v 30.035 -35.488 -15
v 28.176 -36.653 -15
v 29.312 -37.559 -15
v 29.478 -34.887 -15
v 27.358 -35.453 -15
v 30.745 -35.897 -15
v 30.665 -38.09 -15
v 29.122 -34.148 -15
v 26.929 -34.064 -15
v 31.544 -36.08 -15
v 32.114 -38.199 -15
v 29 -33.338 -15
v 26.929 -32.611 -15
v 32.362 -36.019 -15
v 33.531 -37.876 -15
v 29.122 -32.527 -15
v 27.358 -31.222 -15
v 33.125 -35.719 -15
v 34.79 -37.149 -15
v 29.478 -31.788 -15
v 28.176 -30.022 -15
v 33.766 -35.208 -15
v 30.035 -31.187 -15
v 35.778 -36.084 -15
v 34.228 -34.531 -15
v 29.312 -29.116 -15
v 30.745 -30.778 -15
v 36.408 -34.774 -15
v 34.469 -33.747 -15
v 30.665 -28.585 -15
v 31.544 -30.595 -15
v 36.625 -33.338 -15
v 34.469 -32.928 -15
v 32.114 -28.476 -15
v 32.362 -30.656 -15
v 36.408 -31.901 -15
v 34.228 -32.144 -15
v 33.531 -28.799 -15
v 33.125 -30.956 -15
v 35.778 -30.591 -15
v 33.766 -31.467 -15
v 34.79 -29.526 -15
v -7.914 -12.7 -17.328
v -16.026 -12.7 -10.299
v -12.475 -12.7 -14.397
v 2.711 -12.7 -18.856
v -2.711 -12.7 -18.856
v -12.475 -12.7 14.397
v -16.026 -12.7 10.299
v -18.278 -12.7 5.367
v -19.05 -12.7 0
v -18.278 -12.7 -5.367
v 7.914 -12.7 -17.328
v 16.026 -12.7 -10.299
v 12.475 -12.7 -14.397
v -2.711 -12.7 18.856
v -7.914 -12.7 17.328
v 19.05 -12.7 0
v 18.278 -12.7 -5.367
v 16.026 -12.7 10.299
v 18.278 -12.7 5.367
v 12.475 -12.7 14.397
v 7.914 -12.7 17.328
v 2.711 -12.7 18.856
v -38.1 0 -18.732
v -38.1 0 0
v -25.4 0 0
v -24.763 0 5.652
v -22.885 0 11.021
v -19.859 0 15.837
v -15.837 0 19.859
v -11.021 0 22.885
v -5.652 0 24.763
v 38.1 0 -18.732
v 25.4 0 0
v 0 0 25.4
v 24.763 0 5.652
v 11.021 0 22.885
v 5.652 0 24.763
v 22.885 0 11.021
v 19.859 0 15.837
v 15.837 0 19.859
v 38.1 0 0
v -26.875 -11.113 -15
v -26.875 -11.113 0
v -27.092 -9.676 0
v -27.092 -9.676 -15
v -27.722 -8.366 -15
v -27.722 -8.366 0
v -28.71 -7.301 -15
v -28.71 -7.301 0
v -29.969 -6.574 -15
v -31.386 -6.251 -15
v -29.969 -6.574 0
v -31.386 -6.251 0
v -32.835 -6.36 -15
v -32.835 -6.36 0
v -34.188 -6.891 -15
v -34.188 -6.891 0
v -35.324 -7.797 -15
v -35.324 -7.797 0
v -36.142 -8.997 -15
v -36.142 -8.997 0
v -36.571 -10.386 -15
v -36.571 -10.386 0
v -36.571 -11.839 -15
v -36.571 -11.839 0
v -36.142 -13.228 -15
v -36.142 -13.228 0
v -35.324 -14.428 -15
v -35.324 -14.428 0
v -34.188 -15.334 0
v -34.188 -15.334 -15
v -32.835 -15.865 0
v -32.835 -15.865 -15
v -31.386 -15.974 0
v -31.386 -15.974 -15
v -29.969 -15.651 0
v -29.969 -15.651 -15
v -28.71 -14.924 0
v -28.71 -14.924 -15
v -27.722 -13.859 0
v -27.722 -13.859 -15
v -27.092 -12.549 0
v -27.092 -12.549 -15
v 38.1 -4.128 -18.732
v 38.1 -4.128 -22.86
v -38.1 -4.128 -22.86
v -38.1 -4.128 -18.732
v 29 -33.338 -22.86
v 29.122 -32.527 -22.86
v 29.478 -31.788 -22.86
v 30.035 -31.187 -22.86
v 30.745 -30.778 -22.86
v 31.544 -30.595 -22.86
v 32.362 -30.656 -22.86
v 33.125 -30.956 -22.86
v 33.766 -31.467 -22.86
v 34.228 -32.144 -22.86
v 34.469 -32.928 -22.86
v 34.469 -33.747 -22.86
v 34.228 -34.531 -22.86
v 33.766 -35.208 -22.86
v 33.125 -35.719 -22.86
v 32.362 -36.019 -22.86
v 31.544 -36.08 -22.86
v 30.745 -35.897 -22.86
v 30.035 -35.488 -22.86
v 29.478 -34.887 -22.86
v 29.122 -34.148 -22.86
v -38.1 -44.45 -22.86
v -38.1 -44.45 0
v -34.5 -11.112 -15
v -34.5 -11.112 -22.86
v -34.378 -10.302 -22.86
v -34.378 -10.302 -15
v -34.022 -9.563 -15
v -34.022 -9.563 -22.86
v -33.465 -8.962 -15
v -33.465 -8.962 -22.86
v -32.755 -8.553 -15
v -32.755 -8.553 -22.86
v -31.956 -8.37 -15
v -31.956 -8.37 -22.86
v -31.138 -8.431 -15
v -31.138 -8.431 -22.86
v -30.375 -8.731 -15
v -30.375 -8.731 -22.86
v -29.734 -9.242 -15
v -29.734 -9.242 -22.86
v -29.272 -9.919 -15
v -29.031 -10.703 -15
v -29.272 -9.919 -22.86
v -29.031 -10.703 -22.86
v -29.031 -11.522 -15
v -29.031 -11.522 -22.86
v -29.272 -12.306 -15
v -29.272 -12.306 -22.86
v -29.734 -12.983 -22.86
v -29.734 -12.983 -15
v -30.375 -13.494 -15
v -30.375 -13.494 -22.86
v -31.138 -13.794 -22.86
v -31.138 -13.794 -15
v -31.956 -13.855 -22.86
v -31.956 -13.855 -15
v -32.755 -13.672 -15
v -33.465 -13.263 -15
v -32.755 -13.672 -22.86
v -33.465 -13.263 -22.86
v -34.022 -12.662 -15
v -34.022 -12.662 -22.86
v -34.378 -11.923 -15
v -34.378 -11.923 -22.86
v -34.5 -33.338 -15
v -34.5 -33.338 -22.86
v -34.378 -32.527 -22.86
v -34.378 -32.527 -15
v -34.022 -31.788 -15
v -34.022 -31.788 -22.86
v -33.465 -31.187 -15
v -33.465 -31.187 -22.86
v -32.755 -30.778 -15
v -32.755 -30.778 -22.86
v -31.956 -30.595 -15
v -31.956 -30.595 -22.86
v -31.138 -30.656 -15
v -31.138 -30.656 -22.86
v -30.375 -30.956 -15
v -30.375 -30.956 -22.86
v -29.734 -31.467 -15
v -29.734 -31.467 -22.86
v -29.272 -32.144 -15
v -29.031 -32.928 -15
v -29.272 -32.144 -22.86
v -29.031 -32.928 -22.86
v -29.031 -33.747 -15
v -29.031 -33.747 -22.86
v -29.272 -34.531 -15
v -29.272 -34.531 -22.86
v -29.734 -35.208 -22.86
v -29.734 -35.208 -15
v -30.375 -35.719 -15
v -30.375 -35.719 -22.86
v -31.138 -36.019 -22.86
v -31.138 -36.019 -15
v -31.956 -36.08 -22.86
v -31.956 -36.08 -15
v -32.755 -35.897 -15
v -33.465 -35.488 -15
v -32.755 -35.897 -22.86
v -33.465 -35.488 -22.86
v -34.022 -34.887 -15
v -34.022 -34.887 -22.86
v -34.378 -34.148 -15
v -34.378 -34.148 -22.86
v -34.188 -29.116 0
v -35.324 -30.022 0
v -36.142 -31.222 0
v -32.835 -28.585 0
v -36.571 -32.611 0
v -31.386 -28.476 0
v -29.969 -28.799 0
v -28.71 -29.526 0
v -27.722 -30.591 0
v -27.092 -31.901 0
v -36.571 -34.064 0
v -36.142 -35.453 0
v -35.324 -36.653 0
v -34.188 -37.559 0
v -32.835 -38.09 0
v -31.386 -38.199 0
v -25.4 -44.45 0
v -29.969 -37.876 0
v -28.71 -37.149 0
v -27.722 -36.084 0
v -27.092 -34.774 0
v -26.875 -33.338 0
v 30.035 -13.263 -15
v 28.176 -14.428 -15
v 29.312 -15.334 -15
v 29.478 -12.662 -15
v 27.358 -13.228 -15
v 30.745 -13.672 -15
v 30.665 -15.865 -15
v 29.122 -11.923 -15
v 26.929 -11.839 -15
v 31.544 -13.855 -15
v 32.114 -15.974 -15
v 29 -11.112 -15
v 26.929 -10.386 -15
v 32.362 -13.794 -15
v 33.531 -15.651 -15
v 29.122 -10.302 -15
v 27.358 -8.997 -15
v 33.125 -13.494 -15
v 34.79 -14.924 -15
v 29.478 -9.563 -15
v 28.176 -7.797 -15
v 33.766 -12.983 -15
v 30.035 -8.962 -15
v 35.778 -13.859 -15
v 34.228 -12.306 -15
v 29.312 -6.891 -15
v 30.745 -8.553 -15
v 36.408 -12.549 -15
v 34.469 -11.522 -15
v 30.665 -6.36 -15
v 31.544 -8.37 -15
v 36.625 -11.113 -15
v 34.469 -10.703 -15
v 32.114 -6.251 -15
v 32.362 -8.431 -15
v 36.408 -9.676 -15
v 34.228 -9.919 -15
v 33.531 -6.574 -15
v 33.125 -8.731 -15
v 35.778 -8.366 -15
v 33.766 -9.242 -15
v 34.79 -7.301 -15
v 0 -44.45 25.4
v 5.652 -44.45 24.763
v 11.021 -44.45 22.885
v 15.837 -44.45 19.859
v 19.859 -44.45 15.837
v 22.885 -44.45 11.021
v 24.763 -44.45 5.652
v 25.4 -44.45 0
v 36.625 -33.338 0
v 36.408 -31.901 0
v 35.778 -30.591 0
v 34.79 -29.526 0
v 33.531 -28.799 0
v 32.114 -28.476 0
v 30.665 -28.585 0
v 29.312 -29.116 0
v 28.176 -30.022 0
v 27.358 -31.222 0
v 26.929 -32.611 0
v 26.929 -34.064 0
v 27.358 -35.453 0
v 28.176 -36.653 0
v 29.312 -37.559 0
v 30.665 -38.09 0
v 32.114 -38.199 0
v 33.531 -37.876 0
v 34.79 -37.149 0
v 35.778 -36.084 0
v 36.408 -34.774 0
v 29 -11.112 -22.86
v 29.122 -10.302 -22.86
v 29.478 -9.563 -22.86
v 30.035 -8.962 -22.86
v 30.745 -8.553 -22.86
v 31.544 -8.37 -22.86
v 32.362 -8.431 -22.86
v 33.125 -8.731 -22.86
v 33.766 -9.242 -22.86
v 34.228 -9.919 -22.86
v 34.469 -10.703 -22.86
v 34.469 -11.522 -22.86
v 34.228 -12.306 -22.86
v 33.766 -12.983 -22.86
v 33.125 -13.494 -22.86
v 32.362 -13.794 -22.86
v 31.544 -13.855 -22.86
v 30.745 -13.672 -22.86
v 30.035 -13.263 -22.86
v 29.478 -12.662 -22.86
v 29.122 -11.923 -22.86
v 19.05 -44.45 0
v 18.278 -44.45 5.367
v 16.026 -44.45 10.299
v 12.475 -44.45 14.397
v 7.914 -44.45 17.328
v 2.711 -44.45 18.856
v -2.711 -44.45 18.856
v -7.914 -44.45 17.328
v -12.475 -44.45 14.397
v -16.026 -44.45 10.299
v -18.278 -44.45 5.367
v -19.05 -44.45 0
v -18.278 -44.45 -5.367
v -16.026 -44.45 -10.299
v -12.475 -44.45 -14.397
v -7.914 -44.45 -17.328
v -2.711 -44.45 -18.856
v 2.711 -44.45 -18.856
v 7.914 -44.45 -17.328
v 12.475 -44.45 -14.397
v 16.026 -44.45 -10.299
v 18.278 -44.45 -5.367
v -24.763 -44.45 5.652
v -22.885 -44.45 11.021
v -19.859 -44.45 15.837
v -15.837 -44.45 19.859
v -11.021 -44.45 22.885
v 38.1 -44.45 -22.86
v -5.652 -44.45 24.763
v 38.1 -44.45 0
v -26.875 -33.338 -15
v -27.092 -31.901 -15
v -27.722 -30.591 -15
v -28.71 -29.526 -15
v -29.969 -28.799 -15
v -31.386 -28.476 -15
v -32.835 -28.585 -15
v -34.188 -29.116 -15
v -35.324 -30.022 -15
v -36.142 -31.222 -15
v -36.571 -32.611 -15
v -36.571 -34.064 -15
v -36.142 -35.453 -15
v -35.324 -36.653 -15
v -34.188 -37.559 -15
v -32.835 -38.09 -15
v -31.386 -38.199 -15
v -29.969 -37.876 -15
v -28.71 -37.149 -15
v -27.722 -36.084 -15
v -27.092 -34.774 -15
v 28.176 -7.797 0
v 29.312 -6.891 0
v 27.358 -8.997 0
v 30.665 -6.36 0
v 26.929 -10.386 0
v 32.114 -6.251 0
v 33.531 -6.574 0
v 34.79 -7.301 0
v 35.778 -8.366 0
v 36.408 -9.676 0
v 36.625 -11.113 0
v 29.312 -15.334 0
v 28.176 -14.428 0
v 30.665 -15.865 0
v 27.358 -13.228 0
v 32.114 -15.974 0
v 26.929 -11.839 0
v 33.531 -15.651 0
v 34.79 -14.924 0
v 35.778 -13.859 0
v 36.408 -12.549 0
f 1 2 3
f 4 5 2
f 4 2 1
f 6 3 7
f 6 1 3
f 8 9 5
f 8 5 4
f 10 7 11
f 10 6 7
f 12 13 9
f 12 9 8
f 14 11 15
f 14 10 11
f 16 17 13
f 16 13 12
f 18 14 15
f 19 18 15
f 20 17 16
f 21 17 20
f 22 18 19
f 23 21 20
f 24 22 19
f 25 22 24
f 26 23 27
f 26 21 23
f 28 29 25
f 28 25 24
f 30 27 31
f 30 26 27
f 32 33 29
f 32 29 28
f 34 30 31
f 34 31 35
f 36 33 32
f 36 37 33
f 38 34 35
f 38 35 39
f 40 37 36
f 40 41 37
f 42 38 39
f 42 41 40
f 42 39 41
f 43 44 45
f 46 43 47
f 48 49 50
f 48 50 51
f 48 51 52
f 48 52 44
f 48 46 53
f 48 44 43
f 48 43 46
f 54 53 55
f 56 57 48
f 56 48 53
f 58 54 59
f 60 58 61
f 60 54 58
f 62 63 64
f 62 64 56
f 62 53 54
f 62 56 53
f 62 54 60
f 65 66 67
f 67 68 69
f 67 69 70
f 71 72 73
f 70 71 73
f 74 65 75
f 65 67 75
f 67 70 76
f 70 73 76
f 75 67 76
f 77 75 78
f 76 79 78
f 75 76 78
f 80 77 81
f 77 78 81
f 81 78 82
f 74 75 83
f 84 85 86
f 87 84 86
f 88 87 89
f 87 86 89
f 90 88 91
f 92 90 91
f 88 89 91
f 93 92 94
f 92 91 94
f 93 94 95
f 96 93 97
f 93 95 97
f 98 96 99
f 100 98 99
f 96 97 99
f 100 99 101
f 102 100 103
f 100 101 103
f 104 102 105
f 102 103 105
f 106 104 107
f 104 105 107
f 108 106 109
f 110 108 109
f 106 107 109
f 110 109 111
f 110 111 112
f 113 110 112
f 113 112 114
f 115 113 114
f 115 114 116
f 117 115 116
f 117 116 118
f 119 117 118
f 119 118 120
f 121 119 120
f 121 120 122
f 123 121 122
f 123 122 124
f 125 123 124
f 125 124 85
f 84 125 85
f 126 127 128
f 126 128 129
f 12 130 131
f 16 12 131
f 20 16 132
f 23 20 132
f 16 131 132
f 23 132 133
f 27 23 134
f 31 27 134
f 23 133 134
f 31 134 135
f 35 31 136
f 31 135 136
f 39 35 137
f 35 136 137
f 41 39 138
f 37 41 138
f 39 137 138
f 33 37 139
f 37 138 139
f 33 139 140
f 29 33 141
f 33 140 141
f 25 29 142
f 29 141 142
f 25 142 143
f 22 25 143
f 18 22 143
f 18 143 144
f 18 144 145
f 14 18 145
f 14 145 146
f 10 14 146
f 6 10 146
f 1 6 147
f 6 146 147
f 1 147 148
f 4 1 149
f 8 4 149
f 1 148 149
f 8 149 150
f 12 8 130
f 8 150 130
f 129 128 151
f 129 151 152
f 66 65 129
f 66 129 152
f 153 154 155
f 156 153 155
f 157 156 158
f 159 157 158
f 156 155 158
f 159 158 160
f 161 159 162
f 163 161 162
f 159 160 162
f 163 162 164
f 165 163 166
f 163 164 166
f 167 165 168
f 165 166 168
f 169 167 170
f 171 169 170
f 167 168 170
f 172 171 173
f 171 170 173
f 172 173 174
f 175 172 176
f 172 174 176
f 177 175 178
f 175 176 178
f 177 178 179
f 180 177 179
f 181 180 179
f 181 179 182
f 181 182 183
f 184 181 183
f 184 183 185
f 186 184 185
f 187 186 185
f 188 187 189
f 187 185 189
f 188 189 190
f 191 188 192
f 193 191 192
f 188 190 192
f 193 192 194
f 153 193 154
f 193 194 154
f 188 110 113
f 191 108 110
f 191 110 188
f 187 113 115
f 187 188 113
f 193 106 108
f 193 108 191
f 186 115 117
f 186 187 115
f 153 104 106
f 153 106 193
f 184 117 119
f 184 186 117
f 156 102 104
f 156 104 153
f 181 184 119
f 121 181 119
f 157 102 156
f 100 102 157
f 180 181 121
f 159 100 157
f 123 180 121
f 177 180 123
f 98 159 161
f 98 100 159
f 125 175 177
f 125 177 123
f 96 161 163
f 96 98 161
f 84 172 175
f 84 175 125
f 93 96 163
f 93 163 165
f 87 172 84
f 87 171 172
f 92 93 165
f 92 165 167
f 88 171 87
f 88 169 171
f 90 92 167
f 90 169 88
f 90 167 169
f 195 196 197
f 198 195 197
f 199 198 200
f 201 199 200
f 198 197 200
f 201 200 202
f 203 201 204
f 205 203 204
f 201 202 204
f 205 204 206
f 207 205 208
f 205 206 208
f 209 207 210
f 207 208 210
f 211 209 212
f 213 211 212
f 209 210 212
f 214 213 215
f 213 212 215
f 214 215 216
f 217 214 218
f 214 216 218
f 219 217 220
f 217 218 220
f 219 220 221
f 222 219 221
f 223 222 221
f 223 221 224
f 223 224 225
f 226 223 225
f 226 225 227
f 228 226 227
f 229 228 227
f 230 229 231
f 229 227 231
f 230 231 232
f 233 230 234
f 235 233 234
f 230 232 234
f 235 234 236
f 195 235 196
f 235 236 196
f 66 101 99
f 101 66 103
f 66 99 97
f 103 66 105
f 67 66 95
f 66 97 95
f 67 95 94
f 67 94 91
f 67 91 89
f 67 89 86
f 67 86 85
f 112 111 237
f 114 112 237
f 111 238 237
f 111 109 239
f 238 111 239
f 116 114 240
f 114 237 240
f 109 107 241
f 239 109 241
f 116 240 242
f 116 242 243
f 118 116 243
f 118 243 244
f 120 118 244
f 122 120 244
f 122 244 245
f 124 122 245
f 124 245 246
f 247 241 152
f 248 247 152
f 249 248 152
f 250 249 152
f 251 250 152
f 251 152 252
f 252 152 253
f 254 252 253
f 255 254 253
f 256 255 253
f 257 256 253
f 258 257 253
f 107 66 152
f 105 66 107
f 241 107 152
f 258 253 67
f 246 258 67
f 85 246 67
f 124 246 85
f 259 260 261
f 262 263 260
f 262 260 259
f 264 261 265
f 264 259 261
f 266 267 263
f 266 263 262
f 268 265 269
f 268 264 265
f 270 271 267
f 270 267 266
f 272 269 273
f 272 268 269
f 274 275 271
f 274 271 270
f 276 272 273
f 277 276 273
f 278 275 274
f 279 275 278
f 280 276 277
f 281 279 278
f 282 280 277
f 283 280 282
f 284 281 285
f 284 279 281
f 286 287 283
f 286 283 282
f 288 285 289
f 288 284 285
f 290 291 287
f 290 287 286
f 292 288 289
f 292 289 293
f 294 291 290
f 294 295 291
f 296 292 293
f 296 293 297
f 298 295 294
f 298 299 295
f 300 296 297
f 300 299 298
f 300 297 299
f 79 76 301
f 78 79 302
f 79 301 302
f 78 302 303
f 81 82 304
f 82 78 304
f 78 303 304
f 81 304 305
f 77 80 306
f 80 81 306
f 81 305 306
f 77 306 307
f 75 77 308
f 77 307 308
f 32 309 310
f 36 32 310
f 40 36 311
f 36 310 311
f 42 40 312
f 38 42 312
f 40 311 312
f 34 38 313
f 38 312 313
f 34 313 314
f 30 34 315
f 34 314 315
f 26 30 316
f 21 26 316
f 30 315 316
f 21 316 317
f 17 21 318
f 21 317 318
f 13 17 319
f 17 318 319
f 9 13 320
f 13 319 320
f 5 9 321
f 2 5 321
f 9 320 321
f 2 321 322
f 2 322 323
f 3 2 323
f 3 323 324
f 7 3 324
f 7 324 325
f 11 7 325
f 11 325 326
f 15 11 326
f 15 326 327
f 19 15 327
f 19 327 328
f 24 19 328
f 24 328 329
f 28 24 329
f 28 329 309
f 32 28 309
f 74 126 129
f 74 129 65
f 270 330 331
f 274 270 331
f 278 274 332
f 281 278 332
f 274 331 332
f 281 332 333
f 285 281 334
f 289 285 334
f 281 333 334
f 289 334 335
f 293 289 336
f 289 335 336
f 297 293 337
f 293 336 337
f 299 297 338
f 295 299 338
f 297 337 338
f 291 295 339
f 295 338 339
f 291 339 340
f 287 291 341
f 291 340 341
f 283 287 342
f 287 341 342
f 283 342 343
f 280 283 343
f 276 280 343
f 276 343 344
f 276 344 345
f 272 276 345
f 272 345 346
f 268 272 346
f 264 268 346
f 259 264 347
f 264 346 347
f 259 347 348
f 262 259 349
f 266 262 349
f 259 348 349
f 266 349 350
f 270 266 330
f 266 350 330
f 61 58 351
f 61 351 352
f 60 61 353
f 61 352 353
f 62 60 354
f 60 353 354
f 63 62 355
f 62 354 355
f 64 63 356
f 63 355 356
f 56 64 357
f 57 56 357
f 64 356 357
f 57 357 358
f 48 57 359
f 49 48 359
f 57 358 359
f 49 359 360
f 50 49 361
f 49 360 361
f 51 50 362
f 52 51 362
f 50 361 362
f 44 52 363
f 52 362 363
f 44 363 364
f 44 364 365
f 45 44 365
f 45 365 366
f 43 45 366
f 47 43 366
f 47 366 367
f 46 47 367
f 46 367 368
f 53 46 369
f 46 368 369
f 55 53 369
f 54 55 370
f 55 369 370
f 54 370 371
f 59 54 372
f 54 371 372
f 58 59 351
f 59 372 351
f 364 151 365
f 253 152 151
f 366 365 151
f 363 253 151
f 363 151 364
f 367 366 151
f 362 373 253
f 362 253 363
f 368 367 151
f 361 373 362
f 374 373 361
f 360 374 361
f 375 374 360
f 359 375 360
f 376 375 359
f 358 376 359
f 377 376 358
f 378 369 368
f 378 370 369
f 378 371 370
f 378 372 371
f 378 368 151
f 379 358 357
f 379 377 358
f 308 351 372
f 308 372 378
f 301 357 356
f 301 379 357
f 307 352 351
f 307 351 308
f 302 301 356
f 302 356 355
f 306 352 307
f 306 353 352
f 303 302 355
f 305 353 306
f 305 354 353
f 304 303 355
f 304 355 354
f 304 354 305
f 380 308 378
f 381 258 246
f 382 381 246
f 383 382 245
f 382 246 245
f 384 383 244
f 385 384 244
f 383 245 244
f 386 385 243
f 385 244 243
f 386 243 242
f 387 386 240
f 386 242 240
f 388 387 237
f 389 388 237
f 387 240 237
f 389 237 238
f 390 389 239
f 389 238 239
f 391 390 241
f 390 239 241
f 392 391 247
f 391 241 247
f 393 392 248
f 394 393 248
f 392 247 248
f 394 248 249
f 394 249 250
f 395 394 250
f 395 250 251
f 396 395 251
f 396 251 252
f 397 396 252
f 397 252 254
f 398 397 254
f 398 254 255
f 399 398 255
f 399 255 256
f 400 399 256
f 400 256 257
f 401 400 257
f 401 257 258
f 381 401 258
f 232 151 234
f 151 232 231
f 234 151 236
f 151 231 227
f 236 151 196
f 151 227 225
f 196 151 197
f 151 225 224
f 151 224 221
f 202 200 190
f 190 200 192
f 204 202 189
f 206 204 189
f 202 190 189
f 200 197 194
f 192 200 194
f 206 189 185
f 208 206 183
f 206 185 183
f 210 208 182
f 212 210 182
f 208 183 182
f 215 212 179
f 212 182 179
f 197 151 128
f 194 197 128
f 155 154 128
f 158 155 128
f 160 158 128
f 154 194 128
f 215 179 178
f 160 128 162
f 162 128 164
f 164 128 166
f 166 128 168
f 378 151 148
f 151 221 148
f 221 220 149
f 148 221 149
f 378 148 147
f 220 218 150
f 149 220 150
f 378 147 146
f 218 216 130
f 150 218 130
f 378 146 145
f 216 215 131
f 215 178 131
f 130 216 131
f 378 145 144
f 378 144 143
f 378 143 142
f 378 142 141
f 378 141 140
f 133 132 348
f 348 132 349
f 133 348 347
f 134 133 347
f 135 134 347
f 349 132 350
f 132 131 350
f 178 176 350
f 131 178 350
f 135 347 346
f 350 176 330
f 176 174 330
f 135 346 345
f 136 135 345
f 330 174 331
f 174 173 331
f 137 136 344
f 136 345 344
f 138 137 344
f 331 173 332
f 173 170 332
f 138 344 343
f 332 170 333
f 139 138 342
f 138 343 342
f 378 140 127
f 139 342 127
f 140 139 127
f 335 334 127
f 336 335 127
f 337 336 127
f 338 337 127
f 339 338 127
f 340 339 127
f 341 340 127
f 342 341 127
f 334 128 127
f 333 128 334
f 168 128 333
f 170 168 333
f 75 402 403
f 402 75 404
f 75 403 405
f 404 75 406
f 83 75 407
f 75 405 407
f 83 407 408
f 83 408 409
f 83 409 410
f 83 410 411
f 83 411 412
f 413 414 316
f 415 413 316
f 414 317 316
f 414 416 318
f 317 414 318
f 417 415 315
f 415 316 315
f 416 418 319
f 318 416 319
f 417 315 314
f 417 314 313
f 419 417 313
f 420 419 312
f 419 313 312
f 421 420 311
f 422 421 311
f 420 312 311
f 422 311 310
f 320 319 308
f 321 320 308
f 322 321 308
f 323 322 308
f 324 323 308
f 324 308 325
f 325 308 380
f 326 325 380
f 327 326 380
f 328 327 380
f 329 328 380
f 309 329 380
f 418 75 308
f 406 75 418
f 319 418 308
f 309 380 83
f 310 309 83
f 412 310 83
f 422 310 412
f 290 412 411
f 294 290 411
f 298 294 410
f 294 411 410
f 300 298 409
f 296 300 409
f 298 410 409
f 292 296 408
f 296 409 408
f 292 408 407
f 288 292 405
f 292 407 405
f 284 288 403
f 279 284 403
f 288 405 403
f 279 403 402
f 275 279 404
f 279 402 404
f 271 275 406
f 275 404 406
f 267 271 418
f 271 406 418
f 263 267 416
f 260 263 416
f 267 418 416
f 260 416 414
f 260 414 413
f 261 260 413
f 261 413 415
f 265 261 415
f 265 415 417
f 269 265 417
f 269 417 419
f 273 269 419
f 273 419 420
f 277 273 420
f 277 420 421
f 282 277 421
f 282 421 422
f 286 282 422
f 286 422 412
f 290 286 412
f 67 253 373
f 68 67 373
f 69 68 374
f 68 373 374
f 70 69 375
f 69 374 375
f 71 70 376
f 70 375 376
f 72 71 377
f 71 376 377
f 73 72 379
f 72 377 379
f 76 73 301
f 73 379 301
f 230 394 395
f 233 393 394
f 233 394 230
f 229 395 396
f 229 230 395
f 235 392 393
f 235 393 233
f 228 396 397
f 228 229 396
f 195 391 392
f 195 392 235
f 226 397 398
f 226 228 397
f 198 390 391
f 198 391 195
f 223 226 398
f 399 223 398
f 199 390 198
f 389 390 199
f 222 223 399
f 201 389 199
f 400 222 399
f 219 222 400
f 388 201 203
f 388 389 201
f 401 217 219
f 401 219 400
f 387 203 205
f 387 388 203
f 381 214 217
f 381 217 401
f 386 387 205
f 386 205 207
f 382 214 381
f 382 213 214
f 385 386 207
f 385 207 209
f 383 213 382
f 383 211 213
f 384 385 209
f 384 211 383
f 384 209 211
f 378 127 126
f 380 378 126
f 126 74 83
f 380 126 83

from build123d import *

# Parameters (mm, degrees)
F0_W           = 76.2
F0_H           = 50.8
F1_DEPTH       = 44.45
F2_R           = 19.05
F3_DEPTH       = 31.75
F5_DEPTH       = 62.992
F7_D           = 5.5
F7_DEPTH       = 254
F7_CBORE_D     = 9.75
F7_CBORE_DEPTH = 15
F7_TIP         = 1.6523667023
F8_DEPTH       = 2.54
F9_W           = 4.1275
F9_H           = 4.1275
F10_DEPTH      = 86.36


with BuildPart() as f1:
    # F0 (on Front) → F1 (new body)
    with BuildSketch(Plane.XZ):
        Rectangle(F0_W, F0_H)
    extrude(amount=F1_DEPTH)

    # F2 (on face) → F3 (cut)
    with BuildSketch(Plane.XZ.offset(44.45)):
        Circle(F2_R)
    extrude(amount=-F3_DEPTH, mode=Mode.SUBTRACT)

    # F4 (on face) → F5 (cut)
    with BuildSketch(Plane.XZ.offset(44.45)):
        with BuildLine():
            ThreePointArc((1.5e-09, 25.4), (17.9605122427, 17.9605122416), (25.4, 0))
            Line((25.4, 0), (38.1, 0))
            Line((38.1, 0), (38.1, 25.4))
            Line((38.1, 25.4), (1.5e-09, 25.4))
        make_face()
        with BuildLine():
            ThreePointArc((-25.4, 0), (-17.9605122416, 17.9605122427), (1.5e-09, 25.4))
            Line((1.5e-09, 25.4), (-38.1, 25.4))
            Line((-38.1, 25.4), (-38.1, 0))
            Line((-38.1, 0), (-25.4, 0))
        make_face()
    extrude(amount=-F5_DEPTH, mode=Mode.SUBTRACT)

    # F7
    with Locations(Plane.XY):
        with Locations((-31.75, -11.1125), (-31.75, -33.3375), (31.75, -33.3375), (31.75, -11.1125)):
            CounterBoreHole(F7_D / 2, F7_CBORE_D / 2, F7_CBORE_DEPTH, depth=F7_DEPTH)
            with Locations((0, 0, -(F7_DEPTH + F7_TIP / 2))):  # 118° drill point
                Cone(0, F7_D / 2, F7_TIP, mode=Mode.SUBTRACT)

    # F8 (cut): a face of the model
    f8_faces = [f1.faces().sort_by_distance(p)[0] for p in [
        (0, -22.225, -25.4),
    ]]
    extrude(f8_faces, amount=-F8_DEPTH, mode=Mode.SUBTRACT)

    # F9 (on face) → F10 (cut)
    with BuildSketch(Plane.YZ.offset(38.1)):
        with Locations((-2.06375, -20.79625)):
            Rectangle(F9_W, F9_H)
    extrude(amount=-F10_DEPTH, mode=Mode.SUBTRACT)


solid = f1.part
